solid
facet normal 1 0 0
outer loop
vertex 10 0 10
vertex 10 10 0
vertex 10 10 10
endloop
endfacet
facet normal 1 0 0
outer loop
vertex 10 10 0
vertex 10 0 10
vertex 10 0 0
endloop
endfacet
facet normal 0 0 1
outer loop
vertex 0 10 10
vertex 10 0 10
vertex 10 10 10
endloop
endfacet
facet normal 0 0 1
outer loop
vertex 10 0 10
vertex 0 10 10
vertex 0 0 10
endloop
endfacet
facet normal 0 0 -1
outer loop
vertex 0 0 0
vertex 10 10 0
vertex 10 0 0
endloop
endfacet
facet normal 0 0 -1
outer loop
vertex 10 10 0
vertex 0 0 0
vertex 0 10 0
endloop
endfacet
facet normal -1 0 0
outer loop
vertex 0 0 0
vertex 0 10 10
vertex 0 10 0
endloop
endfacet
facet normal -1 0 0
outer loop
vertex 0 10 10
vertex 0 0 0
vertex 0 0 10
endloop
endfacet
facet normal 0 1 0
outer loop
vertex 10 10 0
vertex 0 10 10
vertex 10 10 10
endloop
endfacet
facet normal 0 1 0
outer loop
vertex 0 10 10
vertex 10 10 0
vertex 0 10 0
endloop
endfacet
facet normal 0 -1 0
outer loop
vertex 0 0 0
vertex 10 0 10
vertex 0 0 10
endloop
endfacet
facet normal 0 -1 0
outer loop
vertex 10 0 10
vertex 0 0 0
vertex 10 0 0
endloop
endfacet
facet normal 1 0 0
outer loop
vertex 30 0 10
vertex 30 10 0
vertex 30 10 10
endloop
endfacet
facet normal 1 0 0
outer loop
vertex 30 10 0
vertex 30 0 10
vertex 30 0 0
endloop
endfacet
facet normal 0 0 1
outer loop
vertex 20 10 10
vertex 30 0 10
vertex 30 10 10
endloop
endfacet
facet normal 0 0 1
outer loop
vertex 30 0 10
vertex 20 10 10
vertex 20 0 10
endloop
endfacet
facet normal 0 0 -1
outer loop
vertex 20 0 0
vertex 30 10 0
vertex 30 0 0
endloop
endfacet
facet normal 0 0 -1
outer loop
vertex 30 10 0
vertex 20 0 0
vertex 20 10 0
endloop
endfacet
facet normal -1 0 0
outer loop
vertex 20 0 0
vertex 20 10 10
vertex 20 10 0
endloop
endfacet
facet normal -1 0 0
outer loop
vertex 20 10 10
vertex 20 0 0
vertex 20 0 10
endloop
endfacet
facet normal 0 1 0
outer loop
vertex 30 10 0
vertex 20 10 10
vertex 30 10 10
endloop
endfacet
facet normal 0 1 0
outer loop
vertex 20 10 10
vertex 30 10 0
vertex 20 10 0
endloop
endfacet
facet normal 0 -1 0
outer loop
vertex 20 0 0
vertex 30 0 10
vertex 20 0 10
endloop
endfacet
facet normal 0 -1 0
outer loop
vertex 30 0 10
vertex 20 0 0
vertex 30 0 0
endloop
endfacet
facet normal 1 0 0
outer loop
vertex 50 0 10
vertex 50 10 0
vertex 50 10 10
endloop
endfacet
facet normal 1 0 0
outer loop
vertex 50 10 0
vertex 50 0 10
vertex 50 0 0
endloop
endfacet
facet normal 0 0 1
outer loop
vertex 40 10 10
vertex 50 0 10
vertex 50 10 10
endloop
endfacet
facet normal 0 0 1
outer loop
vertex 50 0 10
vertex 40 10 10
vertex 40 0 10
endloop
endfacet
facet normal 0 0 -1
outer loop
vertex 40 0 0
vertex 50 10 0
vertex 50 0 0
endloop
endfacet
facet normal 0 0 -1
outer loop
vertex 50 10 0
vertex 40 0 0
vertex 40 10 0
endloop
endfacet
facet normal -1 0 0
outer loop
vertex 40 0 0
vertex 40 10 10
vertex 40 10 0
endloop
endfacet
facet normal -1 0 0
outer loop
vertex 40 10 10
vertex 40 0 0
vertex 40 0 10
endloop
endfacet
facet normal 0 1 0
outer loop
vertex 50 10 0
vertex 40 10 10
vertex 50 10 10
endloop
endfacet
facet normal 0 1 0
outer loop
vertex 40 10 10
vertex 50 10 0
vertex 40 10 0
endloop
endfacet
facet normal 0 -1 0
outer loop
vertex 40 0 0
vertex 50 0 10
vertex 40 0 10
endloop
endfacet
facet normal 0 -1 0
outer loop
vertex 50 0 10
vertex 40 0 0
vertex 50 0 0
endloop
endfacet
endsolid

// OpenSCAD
cube([10,10,10]);

translate([20,0,0]) {
    cube([10,10,10]);
}

translate([40,0,0]) {
    cube([10,10,10]);
}
